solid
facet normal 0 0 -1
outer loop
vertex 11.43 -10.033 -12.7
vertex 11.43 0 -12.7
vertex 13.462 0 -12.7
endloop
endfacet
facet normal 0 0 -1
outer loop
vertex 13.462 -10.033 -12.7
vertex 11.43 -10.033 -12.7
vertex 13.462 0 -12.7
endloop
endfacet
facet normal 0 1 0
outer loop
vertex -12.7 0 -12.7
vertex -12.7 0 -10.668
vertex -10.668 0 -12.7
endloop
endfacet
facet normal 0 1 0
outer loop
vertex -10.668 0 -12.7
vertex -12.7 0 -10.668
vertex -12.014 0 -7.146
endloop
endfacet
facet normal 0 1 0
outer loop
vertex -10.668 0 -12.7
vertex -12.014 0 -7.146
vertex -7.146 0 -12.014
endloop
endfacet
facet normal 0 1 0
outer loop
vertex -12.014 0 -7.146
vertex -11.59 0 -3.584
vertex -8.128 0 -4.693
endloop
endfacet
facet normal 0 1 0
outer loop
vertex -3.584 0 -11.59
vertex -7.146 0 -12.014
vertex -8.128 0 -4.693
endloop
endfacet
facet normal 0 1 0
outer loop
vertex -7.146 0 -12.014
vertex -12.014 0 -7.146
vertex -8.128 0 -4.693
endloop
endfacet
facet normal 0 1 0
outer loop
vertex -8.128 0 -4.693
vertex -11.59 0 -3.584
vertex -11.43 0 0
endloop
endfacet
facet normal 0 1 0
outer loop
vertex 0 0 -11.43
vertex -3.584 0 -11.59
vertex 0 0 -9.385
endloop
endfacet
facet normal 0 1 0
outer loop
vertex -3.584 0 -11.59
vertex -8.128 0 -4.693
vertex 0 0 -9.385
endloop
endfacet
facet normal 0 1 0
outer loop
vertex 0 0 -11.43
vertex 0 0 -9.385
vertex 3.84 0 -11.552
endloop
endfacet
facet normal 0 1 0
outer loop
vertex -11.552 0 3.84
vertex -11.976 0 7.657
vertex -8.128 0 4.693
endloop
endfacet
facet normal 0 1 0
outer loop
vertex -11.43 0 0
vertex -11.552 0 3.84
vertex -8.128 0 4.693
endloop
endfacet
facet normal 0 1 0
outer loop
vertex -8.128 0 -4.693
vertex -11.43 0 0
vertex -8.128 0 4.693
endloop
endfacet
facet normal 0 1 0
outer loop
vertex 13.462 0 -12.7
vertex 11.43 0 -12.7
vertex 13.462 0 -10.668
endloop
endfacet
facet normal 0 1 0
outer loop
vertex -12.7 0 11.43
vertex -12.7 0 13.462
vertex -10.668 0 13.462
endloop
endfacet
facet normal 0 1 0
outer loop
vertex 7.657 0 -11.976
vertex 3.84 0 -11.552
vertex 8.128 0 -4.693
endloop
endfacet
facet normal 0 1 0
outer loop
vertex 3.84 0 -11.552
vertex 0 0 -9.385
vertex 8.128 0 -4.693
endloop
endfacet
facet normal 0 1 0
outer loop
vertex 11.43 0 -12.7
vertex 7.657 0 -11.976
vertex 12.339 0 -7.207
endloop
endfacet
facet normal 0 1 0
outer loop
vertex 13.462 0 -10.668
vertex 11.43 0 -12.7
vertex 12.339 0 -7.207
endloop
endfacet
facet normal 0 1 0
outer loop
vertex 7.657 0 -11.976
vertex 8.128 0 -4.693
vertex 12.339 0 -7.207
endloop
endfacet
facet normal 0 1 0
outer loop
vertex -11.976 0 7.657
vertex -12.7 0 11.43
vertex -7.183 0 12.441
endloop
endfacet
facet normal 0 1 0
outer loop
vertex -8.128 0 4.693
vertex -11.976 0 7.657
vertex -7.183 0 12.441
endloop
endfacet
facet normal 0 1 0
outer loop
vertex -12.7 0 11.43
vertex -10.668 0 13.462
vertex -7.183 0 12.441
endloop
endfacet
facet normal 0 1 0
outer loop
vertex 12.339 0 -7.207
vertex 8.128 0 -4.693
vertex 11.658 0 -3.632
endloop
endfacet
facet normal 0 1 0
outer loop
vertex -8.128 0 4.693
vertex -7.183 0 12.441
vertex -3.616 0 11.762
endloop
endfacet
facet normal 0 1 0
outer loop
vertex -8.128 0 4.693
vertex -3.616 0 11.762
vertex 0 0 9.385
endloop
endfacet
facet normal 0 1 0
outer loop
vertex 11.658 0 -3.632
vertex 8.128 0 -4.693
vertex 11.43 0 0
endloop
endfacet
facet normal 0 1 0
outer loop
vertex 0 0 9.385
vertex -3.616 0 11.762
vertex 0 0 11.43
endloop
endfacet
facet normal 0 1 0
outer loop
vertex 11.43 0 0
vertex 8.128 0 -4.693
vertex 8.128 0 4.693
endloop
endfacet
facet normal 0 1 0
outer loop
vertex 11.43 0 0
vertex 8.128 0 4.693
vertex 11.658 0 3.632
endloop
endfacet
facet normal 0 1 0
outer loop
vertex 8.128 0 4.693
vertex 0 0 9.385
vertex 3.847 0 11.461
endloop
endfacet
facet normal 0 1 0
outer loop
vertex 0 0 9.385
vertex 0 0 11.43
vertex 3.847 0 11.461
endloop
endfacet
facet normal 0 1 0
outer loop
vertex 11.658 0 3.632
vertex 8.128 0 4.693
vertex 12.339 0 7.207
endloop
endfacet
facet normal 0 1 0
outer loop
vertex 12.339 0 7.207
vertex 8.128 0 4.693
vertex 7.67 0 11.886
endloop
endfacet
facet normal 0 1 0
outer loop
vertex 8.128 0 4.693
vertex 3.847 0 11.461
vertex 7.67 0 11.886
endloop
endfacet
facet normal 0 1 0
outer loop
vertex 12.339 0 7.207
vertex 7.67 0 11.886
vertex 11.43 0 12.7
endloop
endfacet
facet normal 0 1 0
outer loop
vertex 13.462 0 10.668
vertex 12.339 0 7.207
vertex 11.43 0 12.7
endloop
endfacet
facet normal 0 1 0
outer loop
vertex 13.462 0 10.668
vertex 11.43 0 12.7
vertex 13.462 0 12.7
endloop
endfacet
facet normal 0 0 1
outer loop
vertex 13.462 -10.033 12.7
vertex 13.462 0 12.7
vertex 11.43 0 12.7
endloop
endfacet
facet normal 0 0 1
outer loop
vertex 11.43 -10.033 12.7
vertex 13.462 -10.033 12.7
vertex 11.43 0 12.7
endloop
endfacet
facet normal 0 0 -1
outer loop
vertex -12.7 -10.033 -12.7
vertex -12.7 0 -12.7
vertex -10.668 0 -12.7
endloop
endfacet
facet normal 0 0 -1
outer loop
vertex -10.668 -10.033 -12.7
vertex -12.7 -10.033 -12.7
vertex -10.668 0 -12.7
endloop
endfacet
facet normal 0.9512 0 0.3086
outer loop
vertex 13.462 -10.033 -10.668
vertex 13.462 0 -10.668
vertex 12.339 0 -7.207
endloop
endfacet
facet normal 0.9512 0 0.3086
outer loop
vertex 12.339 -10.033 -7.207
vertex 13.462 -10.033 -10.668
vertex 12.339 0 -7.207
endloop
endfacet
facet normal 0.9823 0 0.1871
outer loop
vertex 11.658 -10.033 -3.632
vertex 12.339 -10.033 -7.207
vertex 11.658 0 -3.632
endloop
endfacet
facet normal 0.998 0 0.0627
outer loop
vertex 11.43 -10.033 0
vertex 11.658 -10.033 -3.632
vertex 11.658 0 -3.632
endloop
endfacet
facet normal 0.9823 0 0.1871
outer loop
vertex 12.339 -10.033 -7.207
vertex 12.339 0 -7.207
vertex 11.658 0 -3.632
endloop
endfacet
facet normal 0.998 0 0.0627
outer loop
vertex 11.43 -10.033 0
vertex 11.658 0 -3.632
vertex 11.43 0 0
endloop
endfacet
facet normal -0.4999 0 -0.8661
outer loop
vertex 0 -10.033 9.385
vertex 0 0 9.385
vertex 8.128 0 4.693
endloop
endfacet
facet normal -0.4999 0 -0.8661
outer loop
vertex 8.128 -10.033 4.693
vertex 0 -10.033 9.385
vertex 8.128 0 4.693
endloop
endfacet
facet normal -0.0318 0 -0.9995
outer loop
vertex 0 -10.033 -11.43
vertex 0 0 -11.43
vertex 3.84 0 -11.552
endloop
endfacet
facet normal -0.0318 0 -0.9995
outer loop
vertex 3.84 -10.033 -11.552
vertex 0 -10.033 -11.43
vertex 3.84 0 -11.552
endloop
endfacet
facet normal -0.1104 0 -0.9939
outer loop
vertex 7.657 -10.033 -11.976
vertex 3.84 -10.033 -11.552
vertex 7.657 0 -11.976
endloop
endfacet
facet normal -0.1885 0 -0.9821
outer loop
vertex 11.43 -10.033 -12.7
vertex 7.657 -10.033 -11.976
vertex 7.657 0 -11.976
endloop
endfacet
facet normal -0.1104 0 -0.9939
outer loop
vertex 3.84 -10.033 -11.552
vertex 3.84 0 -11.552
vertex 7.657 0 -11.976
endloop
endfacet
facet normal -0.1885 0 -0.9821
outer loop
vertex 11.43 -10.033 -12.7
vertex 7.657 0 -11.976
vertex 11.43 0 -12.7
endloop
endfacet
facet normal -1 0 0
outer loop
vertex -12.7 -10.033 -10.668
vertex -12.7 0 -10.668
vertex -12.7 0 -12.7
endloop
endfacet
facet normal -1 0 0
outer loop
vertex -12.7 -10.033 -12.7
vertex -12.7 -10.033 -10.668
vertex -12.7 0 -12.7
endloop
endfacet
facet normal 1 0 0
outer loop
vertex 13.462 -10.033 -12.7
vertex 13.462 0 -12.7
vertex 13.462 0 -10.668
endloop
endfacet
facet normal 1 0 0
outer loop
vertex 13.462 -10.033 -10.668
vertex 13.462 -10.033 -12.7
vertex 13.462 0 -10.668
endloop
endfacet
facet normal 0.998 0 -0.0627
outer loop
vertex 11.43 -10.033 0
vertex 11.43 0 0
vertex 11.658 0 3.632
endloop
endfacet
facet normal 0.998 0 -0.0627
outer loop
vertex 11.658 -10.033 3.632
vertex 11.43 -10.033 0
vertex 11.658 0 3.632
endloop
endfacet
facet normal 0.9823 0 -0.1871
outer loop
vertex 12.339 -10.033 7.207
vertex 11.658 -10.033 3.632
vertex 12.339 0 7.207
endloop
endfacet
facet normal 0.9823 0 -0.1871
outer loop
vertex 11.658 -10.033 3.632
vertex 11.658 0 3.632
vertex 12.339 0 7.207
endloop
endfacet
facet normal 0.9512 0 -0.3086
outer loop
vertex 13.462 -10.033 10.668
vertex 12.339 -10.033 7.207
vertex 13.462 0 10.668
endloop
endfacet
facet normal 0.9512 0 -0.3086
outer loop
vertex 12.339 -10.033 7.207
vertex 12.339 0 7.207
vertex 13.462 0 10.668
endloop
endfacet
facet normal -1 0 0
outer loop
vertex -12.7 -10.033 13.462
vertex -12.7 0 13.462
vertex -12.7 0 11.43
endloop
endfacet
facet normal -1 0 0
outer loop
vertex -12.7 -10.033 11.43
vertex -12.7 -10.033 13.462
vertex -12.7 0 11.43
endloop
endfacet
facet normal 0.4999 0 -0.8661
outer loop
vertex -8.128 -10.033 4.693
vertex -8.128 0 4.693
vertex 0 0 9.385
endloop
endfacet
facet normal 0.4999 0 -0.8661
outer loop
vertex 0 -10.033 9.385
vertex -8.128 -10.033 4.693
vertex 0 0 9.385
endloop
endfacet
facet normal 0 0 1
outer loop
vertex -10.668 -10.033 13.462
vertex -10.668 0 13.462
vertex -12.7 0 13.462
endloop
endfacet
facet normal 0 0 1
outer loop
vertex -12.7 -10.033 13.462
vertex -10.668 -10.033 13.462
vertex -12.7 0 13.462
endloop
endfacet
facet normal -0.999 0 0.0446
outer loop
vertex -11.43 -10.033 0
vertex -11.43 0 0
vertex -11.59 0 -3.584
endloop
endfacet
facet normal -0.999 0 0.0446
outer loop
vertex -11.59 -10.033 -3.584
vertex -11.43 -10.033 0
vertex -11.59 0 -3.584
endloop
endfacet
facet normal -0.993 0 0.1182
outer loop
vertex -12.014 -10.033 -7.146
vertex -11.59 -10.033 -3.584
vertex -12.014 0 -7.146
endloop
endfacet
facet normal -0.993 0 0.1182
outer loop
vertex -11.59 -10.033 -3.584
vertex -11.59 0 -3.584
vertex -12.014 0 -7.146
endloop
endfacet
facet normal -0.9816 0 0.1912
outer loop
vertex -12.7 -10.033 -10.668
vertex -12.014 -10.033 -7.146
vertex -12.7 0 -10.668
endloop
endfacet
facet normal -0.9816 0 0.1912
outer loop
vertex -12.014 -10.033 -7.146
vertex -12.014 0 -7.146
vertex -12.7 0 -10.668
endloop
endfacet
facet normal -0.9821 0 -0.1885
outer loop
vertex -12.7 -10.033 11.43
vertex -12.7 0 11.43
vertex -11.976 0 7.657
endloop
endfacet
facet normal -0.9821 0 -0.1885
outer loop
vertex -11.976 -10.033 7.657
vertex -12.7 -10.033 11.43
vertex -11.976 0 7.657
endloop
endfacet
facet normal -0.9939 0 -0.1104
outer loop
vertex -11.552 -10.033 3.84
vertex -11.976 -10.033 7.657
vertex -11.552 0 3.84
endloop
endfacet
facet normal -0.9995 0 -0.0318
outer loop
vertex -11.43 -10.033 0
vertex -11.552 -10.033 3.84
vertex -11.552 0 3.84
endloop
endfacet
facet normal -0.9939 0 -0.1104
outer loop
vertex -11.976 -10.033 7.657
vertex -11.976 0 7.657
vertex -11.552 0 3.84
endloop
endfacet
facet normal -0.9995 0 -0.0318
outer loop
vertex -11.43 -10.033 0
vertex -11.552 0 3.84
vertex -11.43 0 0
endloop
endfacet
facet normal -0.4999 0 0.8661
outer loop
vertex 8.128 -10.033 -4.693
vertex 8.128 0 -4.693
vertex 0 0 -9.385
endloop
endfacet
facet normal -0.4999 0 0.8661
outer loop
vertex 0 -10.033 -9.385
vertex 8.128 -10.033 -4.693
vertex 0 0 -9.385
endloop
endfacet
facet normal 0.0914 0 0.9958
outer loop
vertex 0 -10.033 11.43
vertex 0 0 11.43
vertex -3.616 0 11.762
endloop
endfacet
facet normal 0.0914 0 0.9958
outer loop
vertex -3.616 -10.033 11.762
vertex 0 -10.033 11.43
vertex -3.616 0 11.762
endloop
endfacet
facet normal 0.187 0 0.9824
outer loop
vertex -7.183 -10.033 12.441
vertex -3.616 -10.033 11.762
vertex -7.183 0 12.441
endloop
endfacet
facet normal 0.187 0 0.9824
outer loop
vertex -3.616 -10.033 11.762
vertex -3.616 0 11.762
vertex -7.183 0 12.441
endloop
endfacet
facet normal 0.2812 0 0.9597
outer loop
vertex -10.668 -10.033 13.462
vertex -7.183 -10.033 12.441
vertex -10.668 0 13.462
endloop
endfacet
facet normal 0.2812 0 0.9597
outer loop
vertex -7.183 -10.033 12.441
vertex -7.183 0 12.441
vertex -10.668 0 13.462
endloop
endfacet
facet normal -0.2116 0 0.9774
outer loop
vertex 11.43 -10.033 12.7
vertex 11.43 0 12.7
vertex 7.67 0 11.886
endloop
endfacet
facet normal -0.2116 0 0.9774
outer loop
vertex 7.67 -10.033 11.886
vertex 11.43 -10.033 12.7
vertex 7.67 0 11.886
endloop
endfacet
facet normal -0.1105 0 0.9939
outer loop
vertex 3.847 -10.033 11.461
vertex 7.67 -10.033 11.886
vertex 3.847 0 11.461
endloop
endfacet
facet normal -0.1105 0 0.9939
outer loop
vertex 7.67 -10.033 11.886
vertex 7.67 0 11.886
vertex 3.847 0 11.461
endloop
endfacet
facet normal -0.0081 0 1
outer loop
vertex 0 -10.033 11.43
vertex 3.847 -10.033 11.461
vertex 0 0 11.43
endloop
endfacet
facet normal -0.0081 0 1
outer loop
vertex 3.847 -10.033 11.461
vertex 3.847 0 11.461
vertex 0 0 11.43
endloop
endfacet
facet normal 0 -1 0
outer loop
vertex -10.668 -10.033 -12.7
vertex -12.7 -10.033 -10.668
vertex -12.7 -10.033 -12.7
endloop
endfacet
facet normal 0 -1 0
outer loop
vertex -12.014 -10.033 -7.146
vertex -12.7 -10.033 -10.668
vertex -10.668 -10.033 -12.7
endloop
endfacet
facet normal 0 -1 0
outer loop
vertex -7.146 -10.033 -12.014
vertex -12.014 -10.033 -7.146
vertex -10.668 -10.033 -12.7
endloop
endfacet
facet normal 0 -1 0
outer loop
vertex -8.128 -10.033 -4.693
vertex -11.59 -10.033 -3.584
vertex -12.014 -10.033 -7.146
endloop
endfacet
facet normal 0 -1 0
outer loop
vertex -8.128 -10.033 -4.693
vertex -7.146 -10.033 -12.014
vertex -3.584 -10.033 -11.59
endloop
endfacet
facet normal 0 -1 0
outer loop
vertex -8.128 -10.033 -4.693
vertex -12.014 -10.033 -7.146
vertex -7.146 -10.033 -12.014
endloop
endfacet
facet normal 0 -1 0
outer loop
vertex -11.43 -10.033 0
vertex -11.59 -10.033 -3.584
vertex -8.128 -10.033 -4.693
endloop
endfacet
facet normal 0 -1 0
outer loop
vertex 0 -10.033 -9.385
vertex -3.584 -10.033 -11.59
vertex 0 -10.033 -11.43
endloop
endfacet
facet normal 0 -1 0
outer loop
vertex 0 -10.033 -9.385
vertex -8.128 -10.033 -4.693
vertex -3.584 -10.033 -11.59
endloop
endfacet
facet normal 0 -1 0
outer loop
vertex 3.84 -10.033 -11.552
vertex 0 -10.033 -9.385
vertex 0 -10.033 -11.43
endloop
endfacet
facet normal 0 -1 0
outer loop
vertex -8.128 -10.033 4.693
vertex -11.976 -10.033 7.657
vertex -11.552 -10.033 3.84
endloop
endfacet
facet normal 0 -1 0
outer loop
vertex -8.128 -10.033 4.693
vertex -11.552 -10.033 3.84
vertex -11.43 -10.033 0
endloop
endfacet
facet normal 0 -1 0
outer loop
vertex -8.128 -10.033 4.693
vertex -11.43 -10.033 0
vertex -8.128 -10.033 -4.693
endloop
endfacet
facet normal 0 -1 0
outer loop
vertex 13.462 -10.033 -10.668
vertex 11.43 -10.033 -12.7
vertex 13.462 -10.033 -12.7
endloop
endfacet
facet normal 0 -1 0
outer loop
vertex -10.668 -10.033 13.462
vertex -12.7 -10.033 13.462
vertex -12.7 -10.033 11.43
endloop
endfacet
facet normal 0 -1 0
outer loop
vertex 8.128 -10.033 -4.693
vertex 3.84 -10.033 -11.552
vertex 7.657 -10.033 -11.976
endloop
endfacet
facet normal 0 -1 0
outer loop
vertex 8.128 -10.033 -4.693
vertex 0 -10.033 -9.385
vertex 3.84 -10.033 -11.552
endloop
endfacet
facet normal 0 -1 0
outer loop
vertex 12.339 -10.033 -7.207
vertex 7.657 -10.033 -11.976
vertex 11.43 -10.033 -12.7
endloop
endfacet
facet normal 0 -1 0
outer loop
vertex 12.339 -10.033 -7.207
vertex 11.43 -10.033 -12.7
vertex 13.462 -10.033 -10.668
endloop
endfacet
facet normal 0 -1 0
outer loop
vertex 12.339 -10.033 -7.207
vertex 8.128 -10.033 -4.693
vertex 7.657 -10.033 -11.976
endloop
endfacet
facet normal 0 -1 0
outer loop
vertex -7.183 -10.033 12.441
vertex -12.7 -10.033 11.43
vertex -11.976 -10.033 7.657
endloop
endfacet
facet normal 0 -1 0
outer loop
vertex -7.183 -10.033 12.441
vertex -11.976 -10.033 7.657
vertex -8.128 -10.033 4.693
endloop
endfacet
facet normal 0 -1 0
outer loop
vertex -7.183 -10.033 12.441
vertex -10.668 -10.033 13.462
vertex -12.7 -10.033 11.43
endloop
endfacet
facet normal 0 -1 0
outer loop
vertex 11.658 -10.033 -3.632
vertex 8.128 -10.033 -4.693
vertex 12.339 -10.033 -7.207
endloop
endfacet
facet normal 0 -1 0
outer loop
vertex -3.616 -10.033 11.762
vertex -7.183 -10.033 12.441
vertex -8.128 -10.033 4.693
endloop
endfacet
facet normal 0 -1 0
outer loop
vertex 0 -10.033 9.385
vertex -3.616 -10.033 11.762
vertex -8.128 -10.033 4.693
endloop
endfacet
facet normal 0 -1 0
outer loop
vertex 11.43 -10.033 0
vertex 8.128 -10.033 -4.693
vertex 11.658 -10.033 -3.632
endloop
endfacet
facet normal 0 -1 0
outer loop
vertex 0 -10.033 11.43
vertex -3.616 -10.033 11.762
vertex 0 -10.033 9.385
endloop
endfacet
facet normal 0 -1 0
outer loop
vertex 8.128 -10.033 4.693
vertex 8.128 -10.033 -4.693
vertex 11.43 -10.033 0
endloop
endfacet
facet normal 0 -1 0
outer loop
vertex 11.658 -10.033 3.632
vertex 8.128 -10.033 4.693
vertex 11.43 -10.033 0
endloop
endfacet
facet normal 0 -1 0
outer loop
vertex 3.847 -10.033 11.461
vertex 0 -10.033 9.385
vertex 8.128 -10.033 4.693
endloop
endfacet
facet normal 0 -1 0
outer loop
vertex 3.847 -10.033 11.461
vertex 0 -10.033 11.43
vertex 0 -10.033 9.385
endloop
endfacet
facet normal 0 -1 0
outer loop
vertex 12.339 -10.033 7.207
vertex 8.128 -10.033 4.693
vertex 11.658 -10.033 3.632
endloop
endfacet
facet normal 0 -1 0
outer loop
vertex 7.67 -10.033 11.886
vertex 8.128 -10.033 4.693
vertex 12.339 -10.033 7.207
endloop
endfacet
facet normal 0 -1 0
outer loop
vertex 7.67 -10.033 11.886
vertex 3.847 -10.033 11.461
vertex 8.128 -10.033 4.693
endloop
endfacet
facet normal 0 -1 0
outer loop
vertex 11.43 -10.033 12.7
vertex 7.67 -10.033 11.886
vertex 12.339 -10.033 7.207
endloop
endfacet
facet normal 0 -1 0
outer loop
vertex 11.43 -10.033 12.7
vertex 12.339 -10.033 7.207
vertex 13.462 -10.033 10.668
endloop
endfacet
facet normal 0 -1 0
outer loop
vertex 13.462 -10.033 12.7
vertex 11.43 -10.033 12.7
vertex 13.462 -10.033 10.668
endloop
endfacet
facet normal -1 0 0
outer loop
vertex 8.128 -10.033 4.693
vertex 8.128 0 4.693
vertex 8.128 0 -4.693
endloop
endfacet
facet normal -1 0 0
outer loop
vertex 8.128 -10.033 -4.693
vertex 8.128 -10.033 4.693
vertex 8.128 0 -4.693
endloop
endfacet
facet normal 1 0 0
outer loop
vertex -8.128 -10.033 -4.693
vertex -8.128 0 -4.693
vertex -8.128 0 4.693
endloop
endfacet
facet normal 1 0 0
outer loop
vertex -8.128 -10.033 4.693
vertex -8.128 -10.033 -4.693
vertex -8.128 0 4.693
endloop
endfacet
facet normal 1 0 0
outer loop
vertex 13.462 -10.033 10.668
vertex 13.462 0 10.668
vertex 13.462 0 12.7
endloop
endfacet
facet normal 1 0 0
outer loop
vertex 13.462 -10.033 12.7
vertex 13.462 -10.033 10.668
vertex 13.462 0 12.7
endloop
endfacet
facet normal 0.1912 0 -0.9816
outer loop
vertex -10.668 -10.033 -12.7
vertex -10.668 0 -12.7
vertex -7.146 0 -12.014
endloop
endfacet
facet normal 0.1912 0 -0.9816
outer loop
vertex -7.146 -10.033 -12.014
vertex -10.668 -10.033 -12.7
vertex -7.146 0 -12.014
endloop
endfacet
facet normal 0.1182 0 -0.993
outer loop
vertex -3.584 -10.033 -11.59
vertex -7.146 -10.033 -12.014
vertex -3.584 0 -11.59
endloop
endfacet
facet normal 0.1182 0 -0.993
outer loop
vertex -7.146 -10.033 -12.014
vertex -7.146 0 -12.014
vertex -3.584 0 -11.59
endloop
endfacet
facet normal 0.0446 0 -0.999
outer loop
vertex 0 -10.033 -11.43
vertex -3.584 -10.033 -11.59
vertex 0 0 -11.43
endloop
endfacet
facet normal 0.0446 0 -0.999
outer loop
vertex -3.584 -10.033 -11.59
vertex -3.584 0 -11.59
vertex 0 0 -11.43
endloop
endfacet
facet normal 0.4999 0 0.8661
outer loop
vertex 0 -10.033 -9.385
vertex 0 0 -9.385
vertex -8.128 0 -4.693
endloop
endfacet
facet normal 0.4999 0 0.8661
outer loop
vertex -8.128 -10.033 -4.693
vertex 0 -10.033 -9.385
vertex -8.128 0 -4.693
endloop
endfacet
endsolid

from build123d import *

# Parameters (mm, degrees)
F1_DEPTH = 10.033


with BuildPart() as f1:
    # F0 (on Front) → F1 (new body)
    with BuildSketch(Plane.XZ):
        with BuildLine():
            Line((11.43, 0), (8.128, 0))
            Line((8.128, 0), (8.128, -4.692703))
            Line((8.128, -4.692703), (0, -9.385406))
            Line((0, -9.385406), (-8.128, -4.692703))
            Line((-8.128, -4.692703), (-8.128, 0))
            Line((-8.128, 0), (-10.16, 0))
            Line((-10.16, 0), (-11.43, 0))
            ThreePointArc((-11.43, 0), (-11.769576, -5.36917), (-12.7, -10.668))
            Line((-12.7, -10.668), (-12.7, -12.7))
            Line((-12.7, -12.7), (-10.668, -12.7))
            ThreePointArc((-10.668, -12.7), (-5.36917, -11.769576), (0, -11.43))
            ThreePointArc((0, -11.43), (5.752665, -11.726018), (11.43, -12.7))
            Line((11.43, -12.7), (13.462, -12.7))
            Line((13.462, -12.7), (13.462, -11.684))
            Line((13.462, -11.684), (13.462, -10.668))
            ThreePointArc((13.462, -10.668), (11.942526, -5.4299), (11.43, 0))
        make_face()
        with BuildLine():
            Line((8.128, 4.692703), (8.128, 0))
            Line((8.128, 0), (11.43, 0))
            ThreePointArc((11.43, 0), (11.942526, 5.4299), (13.462, 10.668))
            Line((13.462, 10.668), (13.462, 11.684))
            Line((13.462, 11.684), (13.462, 12.7))
            Line((13.462, 12.7), (11.43, 12.7))
            ThreePointArc((11.43, 12.7), (5.763913, 11.624785), (0, 11.43))
            ThreePointArc((0, 11.43), (-5.407854, 12.058267), (-10.668, 13.462))
            Line((-10.668, 13.462), (-12.7, 13.462))
            Line((-12.7, 13.462), (-12.7, 11.43))
            ThreePointArc((-12.7, 11.43), (-11.726018, 5.752665), (-11.43, 0))
            Line((-11.43, 0), (-10.16, 0))
            Line((-10.16, 0), (-8.128, 0))
            Line((-8.128, 0), (-8.128, 4.692703))
            Line((-8.128, 4.692703), (0, 9.385406))
            Line((0, 9.385406), (8.128, 4.692703))
        make_face()
    extrude(amount=F1_DEPTH)


solid = f1.part
